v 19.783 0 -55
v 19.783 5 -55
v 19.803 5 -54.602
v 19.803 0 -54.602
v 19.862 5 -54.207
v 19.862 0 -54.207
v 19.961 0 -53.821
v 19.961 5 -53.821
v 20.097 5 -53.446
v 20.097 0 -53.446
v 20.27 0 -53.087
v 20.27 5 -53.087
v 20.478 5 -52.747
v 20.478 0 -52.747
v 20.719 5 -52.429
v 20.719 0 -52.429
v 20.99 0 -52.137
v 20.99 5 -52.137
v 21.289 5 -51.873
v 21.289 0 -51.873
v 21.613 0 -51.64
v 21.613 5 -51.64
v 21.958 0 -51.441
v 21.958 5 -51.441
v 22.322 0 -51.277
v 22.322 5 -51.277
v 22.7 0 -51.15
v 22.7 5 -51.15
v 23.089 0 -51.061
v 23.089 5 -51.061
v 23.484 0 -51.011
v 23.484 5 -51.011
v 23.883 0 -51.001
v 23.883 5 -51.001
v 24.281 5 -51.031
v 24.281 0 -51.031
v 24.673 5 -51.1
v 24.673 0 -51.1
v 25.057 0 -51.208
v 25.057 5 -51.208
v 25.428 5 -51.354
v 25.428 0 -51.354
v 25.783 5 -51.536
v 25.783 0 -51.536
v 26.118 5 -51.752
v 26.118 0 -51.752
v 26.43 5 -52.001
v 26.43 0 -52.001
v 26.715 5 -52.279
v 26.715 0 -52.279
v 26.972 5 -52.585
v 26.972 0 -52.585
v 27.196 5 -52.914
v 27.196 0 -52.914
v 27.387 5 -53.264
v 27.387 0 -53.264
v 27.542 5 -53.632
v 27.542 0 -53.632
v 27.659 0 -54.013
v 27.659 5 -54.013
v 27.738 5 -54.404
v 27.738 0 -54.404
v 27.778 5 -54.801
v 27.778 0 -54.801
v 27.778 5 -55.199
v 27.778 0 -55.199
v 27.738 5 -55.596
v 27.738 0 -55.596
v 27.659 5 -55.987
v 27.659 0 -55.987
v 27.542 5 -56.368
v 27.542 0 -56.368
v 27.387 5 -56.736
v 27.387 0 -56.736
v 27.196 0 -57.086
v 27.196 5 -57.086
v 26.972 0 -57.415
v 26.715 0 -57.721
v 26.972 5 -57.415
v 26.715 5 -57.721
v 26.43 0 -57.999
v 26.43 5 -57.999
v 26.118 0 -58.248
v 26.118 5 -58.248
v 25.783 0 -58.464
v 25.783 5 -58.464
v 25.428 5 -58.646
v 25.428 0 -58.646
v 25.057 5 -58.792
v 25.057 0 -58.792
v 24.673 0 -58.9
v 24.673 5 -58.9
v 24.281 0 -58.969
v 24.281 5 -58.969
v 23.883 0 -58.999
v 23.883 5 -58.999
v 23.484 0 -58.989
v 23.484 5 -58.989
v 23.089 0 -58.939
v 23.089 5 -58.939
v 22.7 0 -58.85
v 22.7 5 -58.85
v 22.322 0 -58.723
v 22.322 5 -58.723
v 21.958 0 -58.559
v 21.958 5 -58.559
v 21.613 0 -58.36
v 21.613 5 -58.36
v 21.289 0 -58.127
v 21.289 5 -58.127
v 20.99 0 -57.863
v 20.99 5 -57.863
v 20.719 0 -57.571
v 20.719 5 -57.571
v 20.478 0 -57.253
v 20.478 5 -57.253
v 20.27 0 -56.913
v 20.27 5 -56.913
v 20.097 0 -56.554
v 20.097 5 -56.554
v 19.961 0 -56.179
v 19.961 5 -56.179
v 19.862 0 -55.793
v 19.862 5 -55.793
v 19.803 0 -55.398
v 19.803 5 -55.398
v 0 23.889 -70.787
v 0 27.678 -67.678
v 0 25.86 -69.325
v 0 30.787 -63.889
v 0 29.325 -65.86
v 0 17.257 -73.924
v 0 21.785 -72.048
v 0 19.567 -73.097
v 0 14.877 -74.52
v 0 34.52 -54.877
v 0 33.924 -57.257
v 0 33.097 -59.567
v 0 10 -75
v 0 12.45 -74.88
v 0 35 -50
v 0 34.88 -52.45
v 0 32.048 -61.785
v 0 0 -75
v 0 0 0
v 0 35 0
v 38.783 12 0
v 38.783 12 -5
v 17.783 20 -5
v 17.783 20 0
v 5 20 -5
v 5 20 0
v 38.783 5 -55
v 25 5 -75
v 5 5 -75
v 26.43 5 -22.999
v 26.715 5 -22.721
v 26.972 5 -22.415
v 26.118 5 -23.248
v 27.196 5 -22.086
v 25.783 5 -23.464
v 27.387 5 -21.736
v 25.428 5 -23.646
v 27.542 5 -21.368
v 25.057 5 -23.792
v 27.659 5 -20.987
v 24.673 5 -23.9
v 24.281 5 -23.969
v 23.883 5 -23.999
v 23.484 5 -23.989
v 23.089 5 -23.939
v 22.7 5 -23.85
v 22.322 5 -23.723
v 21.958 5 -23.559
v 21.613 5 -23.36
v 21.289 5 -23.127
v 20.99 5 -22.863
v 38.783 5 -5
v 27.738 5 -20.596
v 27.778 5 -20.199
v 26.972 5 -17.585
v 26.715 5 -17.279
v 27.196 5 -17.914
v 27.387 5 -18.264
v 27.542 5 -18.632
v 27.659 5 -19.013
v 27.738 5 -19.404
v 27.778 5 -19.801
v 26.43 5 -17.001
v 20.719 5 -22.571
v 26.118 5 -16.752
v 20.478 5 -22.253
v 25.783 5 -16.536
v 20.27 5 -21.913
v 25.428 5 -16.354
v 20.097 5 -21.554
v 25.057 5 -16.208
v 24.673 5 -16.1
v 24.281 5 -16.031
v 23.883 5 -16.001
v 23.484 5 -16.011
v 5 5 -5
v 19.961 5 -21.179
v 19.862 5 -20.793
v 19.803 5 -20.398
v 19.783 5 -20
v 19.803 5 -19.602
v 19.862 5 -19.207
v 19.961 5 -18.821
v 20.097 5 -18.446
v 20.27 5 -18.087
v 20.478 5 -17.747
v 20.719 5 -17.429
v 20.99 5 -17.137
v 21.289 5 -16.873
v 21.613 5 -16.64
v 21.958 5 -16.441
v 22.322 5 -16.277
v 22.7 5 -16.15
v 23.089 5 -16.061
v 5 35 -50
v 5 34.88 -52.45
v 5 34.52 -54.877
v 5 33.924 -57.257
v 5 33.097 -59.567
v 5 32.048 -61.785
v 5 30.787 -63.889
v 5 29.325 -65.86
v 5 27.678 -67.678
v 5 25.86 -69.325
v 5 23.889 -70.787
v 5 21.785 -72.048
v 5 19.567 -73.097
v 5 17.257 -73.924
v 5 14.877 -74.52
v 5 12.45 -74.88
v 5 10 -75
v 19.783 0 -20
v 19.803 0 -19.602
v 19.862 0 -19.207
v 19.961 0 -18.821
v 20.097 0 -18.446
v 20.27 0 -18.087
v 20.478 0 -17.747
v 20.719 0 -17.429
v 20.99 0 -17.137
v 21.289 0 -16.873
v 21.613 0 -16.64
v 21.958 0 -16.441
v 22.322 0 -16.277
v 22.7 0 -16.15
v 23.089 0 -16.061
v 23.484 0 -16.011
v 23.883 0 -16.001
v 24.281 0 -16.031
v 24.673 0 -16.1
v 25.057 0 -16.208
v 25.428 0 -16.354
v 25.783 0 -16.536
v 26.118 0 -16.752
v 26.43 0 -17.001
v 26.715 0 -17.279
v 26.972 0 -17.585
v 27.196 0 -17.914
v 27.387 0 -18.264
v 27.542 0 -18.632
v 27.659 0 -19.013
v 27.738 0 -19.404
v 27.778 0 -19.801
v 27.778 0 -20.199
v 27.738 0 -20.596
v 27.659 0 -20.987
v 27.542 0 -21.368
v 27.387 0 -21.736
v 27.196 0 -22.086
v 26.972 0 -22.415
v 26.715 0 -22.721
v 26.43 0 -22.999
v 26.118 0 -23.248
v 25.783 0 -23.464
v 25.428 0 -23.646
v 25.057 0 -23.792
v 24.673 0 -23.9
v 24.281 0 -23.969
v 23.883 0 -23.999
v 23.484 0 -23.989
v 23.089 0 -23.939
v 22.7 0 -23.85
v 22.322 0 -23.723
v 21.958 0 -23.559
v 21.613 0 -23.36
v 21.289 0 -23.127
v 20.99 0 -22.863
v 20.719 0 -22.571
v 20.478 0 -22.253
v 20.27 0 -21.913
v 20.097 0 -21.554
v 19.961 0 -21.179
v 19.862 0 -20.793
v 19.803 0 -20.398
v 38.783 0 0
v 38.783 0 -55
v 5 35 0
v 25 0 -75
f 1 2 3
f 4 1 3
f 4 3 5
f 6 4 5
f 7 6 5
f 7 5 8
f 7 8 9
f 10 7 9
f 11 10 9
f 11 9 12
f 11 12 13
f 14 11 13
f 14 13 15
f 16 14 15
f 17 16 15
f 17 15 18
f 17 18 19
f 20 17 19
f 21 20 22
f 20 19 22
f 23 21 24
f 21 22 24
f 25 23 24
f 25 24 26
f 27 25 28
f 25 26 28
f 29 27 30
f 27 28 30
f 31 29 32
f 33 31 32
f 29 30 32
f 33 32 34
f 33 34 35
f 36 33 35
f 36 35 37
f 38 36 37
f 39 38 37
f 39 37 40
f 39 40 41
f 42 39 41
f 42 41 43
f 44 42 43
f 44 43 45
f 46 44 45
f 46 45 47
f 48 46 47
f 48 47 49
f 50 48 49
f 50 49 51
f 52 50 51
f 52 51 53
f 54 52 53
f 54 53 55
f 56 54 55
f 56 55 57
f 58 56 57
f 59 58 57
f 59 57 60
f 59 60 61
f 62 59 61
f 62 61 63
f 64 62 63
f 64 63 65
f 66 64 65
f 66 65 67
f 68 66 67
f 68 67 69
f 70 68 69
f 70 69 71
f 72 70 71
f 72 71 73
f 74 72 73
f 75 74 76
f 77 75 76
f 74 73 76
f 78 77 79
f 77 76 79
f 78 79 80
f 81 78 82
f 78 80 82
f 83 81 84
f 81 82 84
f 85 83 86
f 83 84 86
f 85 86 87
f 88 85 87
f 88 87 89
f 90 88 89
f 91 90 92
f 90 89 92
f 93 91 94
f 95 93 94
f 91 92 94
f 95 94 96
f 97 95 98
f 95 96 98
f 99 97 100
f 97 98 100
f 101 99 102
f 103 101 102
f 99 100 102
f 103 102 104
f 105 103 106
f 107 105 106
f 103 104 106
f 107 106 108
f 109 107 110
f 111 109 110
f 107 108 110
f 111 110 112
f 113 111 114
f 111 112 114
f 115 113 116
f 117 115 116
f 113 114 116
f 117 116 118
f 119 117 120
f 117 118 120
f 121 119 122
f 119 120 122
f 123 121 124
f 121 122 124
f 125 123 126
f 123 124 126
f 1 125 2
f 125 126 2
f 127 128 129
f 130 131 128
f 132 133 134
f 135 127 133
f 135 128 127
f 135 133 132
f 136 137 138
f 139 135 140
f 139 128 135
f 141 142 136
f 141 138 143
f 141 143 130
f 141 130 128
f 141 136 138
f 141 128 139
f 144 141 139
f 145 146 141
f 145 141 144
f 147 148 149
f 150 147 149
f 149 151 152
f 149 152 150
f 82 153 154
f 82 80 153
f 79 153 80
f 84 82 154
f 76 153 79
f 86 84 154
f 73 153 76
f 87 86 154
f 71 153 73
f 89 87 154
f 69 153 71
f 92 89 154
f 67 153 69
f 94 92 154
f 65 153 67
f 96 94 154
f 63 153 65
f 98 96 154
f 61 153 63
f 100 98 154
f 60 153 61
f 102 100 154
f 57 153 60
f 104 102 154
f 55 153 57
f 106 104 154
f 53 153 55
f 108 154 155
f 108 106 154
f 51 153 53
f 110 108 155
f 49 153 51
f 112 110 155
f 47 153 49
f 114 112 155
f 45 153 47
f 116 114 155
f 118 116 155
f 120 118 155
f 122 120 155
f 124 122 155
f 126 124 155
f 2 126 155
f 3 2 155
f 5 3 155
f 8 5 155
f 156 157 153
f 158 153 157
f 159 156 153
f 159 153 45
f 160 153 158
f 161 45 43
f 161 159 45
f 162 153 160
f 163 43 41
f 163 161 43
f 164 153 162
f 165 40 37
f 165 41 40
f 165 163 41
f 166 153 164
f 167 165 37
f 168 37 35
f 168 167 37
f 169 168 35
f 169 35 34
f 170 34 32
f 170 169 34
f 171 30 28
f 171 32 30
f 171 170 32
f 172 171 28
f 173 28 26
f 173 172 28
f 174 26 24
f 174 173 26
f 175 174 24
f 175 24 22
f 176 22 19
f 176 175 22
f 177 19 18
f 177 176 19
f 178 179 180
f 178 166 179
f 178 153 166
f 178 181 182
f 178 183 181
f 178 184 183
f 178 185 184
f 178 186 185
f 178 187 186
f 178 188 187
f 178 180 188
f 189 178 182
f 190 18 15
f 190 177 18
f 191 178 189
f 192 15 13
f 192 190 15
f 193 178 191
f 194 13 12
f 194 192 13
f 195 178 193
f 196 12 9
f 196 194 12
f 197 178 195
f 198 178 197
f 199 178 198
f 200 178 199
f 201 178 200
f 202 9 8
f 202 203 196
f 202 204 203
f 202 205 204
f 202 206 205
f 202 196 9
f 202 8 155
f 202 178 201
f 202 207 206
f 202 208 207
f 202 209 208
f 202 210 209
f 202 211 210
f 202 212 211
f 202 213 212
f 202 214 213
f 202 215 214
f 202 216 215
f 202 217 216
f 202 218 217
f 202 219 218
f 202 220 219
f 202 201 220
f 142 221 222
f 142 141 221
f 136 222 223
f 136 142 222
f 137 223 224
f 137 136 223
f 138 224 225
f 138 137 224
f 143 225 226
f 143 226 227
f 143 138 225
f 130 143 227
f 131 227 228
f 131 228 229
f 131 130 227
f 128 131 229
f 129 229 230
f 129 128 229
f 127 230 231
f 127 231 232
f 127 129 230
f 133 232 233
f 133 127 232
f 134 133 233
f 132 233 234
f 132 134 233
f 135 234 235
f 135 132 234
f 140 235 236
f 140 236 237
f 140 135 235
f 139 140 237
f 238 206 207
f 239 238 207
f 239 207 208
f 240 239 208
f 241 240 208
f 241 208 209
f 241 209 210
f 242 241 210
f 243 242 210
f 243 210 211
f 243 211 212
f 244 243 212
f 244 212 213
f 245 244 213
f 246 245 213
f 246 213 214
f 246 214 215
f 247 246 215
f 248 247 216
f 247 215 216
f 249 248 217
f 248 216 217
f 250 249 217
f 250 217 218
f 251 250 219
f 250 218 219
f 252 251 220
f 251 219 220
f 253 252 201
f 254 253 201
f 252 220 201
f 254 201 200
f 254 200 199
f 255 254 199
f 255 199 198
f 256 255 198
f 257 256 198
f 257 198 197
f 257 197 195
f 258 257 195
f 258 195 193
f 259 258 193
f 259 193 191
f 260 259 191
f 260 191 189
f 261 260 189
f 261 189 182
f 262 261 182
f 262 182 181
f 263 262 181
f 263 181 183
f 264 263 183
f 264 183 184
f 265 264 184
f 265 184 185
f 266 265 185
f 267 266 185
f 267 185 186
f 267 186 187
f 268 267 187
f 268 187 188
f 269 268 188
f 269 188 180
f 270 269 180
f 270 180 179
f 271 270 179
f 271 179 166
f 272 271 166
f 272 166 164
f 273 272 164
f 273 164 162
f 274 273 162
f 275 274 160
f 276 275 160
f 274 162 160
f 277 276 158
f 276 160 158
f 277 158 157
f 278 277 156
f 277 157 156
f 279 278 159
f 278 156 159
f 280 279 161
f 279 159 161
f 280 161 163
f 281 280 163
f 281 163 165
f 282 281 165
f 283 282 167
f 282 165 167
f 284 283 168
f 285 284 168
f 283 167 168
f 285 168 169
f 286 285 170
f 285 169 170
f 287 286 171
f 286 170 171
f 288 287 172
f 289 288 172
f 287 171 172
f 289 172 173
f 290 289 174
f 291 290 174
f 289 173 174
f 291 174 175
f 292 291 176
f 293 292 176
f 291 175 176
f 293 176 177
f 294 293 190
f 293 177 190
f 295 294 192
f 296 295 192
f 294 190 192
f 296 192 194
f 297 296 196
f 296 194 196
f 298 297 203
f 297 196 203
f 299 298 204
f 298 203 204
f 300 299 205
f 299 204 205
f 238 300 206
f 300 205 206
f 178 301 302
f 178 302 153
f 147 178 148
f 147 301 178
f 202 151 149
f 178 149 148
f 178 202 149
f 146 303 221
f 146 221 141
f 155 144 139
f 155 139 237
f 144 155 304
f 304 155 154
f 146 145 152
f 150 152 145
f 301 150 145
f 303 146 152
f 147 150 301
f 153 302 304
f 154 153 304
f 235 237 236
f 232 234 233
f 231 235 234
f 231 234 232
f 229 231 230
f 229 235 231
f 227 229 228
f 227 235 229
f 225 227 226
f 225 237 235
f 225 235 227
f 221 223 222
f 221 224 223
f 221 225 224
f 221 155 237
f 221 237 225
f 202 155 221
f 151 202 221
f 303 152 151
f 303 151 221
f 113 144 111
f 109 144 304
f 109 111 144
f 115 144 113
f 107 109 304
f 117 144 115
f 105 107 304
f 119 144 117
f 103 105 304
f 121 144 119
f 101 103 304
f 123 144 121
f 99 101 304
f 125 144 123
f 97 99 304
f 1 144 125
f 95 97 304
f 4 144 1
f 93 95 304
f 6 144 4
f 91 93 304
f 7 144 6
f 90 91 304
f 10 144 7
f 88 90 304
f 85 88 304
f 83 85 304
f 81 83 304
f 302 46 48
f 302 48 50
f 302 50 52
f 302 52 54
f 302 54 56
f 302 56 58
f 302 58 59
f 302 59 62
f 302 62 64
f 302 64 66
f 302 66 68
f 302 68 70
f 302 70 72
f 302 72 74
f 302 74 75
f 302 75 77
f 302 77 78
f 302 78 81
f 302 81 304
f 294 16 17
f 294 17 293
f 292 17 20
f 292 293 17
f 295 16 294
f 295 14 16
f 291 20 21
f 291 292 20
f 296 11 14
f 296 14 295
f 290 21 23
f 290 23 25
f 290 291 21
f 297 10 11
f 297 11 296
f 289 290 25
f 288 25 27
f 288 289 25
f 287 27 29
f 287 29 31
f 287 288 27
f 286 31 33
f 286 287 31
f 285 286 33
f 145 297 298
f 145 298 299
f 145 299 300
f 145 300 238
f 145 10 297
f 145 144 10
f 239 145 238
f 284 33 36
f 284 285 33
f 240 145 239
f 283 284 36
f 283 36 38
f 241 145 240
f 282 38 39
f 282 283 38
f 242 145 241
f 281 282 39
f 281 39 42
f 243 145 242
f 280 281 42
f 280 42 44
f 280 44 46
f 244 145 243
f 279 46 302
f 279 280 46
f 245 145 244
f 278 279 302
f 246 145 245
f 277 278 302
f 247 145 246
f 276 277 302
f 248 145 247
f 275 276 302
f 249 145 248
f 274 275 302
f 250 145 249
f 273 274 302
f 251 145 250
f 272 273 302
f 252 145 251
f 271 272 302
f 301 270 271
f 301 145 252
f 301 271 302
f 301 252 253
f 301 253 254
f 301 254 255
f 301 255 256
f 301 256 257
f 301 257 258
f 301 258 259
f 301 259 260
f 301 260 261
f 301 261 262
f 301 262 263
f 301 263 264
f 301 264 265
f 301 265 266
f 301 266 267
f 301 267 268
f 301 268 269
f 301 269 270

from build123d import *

# Parameters (mm, degrees)
DODANIE_WYCI_GNI_CIE1_DEPTH = 75
ZAOKR_GLENIE1_R             = 25
WYTNIJ_WYCI_GNI_CIE1_DEPTH  = 75
SZKIC6_R                    = 4
WYTNIJ_WYCI_GNI_CIE2_DEPTH  = 15
SZKIC7_W                    = 35
SZKIC7_H                    = 5
DODANIE_WYCI_GNI_CIE2_DEPTH = 15
WYTNIJ_WYCI_GNI_CIE3_DEPTH  = 15


with BuildPart() as part:
    # Szkic1 → Dodanie-wyciągnięcie1 (new body)
    with BuildSketch(Plane.XY):
        Polygon((0, 0), (38.783164401, 0), (38.783164401, 5), (5, 5), (5, 35), (0, 35), align=None)
    extrude(amount=-DODANIE_WYCI_GNI_CIE1_DEPTH)

    # Zaokrąglenie1
    zaokr_glenie1_edges = [part.edges().sort_by_distance(p)[0] for p in [
        (2.5, 35, -75),
    ]]
    fillet(zaokr_glenie1_edges, radius=ZAOKR_GLENIE1_R)

    # Szkic5 → Wytnij-wyciągnięcie1 (cut)
    with BuildSketch(Plane.XZ):
        Polygon((38.783164401, -55), (25, -75), (38.783164401, -75), align=None)
    extrude(amount=-WYTNIJ_WYCI_GNI_CIE1_DEPTH, mode=Mode.SUBTRACT)

    # Szkic6 → Wytnij-wyciągnięcie2 (cut)
    with BuildSketch(Plane(origin=(0, 5, 0), x_dir=(1, 0, 0), z_dir=(0, 1, 0))):
        with Locations(Location((23.783164401, 55, 0), (0, 0, 180))):
            Circle(SZKIC6_R)
        with Locations(Location((23.783164401, 20, 0), (0, 0, 180))):
            Circle(SZKIC6_R)
    extrude(amount=-WYTNIJ_WYCI_GNI_CIE2_DEPTH, mode=Mode.SUBTRACT)

    # Szkic7 → Dodanie-wyciągnięcie2 (add)
    with BuildSketch(Plane(origin=(0, 5, 0), x_dir=(1, 0, 0), z_dir=(0, 1, 0))):
        with Locations((21.283164401, 2.5)):
            Rectangle(SZKIC7_W, SZKIC7_H)
    extrude(amount=DODANIE_WYCI_GNI_CIE2_DEPTH)

    # Szkic8 → Wytnij-wyciągnięcie3 (cut)
    with BuildSketch(Plane(origin=(0, 0, -5), x_dir=(-1, 0, 0), z_dir=(0, 0, -1))):
        Polygon((-38.783164401, 12), (-17.783164401, 20), (-38.783164401, 20), align=None)
    extrude(amount=-WYTNIJ_WYCI_GNI_CIE3_DEPTH, mode=Mode.SUBTRACT)


solid = part.part
